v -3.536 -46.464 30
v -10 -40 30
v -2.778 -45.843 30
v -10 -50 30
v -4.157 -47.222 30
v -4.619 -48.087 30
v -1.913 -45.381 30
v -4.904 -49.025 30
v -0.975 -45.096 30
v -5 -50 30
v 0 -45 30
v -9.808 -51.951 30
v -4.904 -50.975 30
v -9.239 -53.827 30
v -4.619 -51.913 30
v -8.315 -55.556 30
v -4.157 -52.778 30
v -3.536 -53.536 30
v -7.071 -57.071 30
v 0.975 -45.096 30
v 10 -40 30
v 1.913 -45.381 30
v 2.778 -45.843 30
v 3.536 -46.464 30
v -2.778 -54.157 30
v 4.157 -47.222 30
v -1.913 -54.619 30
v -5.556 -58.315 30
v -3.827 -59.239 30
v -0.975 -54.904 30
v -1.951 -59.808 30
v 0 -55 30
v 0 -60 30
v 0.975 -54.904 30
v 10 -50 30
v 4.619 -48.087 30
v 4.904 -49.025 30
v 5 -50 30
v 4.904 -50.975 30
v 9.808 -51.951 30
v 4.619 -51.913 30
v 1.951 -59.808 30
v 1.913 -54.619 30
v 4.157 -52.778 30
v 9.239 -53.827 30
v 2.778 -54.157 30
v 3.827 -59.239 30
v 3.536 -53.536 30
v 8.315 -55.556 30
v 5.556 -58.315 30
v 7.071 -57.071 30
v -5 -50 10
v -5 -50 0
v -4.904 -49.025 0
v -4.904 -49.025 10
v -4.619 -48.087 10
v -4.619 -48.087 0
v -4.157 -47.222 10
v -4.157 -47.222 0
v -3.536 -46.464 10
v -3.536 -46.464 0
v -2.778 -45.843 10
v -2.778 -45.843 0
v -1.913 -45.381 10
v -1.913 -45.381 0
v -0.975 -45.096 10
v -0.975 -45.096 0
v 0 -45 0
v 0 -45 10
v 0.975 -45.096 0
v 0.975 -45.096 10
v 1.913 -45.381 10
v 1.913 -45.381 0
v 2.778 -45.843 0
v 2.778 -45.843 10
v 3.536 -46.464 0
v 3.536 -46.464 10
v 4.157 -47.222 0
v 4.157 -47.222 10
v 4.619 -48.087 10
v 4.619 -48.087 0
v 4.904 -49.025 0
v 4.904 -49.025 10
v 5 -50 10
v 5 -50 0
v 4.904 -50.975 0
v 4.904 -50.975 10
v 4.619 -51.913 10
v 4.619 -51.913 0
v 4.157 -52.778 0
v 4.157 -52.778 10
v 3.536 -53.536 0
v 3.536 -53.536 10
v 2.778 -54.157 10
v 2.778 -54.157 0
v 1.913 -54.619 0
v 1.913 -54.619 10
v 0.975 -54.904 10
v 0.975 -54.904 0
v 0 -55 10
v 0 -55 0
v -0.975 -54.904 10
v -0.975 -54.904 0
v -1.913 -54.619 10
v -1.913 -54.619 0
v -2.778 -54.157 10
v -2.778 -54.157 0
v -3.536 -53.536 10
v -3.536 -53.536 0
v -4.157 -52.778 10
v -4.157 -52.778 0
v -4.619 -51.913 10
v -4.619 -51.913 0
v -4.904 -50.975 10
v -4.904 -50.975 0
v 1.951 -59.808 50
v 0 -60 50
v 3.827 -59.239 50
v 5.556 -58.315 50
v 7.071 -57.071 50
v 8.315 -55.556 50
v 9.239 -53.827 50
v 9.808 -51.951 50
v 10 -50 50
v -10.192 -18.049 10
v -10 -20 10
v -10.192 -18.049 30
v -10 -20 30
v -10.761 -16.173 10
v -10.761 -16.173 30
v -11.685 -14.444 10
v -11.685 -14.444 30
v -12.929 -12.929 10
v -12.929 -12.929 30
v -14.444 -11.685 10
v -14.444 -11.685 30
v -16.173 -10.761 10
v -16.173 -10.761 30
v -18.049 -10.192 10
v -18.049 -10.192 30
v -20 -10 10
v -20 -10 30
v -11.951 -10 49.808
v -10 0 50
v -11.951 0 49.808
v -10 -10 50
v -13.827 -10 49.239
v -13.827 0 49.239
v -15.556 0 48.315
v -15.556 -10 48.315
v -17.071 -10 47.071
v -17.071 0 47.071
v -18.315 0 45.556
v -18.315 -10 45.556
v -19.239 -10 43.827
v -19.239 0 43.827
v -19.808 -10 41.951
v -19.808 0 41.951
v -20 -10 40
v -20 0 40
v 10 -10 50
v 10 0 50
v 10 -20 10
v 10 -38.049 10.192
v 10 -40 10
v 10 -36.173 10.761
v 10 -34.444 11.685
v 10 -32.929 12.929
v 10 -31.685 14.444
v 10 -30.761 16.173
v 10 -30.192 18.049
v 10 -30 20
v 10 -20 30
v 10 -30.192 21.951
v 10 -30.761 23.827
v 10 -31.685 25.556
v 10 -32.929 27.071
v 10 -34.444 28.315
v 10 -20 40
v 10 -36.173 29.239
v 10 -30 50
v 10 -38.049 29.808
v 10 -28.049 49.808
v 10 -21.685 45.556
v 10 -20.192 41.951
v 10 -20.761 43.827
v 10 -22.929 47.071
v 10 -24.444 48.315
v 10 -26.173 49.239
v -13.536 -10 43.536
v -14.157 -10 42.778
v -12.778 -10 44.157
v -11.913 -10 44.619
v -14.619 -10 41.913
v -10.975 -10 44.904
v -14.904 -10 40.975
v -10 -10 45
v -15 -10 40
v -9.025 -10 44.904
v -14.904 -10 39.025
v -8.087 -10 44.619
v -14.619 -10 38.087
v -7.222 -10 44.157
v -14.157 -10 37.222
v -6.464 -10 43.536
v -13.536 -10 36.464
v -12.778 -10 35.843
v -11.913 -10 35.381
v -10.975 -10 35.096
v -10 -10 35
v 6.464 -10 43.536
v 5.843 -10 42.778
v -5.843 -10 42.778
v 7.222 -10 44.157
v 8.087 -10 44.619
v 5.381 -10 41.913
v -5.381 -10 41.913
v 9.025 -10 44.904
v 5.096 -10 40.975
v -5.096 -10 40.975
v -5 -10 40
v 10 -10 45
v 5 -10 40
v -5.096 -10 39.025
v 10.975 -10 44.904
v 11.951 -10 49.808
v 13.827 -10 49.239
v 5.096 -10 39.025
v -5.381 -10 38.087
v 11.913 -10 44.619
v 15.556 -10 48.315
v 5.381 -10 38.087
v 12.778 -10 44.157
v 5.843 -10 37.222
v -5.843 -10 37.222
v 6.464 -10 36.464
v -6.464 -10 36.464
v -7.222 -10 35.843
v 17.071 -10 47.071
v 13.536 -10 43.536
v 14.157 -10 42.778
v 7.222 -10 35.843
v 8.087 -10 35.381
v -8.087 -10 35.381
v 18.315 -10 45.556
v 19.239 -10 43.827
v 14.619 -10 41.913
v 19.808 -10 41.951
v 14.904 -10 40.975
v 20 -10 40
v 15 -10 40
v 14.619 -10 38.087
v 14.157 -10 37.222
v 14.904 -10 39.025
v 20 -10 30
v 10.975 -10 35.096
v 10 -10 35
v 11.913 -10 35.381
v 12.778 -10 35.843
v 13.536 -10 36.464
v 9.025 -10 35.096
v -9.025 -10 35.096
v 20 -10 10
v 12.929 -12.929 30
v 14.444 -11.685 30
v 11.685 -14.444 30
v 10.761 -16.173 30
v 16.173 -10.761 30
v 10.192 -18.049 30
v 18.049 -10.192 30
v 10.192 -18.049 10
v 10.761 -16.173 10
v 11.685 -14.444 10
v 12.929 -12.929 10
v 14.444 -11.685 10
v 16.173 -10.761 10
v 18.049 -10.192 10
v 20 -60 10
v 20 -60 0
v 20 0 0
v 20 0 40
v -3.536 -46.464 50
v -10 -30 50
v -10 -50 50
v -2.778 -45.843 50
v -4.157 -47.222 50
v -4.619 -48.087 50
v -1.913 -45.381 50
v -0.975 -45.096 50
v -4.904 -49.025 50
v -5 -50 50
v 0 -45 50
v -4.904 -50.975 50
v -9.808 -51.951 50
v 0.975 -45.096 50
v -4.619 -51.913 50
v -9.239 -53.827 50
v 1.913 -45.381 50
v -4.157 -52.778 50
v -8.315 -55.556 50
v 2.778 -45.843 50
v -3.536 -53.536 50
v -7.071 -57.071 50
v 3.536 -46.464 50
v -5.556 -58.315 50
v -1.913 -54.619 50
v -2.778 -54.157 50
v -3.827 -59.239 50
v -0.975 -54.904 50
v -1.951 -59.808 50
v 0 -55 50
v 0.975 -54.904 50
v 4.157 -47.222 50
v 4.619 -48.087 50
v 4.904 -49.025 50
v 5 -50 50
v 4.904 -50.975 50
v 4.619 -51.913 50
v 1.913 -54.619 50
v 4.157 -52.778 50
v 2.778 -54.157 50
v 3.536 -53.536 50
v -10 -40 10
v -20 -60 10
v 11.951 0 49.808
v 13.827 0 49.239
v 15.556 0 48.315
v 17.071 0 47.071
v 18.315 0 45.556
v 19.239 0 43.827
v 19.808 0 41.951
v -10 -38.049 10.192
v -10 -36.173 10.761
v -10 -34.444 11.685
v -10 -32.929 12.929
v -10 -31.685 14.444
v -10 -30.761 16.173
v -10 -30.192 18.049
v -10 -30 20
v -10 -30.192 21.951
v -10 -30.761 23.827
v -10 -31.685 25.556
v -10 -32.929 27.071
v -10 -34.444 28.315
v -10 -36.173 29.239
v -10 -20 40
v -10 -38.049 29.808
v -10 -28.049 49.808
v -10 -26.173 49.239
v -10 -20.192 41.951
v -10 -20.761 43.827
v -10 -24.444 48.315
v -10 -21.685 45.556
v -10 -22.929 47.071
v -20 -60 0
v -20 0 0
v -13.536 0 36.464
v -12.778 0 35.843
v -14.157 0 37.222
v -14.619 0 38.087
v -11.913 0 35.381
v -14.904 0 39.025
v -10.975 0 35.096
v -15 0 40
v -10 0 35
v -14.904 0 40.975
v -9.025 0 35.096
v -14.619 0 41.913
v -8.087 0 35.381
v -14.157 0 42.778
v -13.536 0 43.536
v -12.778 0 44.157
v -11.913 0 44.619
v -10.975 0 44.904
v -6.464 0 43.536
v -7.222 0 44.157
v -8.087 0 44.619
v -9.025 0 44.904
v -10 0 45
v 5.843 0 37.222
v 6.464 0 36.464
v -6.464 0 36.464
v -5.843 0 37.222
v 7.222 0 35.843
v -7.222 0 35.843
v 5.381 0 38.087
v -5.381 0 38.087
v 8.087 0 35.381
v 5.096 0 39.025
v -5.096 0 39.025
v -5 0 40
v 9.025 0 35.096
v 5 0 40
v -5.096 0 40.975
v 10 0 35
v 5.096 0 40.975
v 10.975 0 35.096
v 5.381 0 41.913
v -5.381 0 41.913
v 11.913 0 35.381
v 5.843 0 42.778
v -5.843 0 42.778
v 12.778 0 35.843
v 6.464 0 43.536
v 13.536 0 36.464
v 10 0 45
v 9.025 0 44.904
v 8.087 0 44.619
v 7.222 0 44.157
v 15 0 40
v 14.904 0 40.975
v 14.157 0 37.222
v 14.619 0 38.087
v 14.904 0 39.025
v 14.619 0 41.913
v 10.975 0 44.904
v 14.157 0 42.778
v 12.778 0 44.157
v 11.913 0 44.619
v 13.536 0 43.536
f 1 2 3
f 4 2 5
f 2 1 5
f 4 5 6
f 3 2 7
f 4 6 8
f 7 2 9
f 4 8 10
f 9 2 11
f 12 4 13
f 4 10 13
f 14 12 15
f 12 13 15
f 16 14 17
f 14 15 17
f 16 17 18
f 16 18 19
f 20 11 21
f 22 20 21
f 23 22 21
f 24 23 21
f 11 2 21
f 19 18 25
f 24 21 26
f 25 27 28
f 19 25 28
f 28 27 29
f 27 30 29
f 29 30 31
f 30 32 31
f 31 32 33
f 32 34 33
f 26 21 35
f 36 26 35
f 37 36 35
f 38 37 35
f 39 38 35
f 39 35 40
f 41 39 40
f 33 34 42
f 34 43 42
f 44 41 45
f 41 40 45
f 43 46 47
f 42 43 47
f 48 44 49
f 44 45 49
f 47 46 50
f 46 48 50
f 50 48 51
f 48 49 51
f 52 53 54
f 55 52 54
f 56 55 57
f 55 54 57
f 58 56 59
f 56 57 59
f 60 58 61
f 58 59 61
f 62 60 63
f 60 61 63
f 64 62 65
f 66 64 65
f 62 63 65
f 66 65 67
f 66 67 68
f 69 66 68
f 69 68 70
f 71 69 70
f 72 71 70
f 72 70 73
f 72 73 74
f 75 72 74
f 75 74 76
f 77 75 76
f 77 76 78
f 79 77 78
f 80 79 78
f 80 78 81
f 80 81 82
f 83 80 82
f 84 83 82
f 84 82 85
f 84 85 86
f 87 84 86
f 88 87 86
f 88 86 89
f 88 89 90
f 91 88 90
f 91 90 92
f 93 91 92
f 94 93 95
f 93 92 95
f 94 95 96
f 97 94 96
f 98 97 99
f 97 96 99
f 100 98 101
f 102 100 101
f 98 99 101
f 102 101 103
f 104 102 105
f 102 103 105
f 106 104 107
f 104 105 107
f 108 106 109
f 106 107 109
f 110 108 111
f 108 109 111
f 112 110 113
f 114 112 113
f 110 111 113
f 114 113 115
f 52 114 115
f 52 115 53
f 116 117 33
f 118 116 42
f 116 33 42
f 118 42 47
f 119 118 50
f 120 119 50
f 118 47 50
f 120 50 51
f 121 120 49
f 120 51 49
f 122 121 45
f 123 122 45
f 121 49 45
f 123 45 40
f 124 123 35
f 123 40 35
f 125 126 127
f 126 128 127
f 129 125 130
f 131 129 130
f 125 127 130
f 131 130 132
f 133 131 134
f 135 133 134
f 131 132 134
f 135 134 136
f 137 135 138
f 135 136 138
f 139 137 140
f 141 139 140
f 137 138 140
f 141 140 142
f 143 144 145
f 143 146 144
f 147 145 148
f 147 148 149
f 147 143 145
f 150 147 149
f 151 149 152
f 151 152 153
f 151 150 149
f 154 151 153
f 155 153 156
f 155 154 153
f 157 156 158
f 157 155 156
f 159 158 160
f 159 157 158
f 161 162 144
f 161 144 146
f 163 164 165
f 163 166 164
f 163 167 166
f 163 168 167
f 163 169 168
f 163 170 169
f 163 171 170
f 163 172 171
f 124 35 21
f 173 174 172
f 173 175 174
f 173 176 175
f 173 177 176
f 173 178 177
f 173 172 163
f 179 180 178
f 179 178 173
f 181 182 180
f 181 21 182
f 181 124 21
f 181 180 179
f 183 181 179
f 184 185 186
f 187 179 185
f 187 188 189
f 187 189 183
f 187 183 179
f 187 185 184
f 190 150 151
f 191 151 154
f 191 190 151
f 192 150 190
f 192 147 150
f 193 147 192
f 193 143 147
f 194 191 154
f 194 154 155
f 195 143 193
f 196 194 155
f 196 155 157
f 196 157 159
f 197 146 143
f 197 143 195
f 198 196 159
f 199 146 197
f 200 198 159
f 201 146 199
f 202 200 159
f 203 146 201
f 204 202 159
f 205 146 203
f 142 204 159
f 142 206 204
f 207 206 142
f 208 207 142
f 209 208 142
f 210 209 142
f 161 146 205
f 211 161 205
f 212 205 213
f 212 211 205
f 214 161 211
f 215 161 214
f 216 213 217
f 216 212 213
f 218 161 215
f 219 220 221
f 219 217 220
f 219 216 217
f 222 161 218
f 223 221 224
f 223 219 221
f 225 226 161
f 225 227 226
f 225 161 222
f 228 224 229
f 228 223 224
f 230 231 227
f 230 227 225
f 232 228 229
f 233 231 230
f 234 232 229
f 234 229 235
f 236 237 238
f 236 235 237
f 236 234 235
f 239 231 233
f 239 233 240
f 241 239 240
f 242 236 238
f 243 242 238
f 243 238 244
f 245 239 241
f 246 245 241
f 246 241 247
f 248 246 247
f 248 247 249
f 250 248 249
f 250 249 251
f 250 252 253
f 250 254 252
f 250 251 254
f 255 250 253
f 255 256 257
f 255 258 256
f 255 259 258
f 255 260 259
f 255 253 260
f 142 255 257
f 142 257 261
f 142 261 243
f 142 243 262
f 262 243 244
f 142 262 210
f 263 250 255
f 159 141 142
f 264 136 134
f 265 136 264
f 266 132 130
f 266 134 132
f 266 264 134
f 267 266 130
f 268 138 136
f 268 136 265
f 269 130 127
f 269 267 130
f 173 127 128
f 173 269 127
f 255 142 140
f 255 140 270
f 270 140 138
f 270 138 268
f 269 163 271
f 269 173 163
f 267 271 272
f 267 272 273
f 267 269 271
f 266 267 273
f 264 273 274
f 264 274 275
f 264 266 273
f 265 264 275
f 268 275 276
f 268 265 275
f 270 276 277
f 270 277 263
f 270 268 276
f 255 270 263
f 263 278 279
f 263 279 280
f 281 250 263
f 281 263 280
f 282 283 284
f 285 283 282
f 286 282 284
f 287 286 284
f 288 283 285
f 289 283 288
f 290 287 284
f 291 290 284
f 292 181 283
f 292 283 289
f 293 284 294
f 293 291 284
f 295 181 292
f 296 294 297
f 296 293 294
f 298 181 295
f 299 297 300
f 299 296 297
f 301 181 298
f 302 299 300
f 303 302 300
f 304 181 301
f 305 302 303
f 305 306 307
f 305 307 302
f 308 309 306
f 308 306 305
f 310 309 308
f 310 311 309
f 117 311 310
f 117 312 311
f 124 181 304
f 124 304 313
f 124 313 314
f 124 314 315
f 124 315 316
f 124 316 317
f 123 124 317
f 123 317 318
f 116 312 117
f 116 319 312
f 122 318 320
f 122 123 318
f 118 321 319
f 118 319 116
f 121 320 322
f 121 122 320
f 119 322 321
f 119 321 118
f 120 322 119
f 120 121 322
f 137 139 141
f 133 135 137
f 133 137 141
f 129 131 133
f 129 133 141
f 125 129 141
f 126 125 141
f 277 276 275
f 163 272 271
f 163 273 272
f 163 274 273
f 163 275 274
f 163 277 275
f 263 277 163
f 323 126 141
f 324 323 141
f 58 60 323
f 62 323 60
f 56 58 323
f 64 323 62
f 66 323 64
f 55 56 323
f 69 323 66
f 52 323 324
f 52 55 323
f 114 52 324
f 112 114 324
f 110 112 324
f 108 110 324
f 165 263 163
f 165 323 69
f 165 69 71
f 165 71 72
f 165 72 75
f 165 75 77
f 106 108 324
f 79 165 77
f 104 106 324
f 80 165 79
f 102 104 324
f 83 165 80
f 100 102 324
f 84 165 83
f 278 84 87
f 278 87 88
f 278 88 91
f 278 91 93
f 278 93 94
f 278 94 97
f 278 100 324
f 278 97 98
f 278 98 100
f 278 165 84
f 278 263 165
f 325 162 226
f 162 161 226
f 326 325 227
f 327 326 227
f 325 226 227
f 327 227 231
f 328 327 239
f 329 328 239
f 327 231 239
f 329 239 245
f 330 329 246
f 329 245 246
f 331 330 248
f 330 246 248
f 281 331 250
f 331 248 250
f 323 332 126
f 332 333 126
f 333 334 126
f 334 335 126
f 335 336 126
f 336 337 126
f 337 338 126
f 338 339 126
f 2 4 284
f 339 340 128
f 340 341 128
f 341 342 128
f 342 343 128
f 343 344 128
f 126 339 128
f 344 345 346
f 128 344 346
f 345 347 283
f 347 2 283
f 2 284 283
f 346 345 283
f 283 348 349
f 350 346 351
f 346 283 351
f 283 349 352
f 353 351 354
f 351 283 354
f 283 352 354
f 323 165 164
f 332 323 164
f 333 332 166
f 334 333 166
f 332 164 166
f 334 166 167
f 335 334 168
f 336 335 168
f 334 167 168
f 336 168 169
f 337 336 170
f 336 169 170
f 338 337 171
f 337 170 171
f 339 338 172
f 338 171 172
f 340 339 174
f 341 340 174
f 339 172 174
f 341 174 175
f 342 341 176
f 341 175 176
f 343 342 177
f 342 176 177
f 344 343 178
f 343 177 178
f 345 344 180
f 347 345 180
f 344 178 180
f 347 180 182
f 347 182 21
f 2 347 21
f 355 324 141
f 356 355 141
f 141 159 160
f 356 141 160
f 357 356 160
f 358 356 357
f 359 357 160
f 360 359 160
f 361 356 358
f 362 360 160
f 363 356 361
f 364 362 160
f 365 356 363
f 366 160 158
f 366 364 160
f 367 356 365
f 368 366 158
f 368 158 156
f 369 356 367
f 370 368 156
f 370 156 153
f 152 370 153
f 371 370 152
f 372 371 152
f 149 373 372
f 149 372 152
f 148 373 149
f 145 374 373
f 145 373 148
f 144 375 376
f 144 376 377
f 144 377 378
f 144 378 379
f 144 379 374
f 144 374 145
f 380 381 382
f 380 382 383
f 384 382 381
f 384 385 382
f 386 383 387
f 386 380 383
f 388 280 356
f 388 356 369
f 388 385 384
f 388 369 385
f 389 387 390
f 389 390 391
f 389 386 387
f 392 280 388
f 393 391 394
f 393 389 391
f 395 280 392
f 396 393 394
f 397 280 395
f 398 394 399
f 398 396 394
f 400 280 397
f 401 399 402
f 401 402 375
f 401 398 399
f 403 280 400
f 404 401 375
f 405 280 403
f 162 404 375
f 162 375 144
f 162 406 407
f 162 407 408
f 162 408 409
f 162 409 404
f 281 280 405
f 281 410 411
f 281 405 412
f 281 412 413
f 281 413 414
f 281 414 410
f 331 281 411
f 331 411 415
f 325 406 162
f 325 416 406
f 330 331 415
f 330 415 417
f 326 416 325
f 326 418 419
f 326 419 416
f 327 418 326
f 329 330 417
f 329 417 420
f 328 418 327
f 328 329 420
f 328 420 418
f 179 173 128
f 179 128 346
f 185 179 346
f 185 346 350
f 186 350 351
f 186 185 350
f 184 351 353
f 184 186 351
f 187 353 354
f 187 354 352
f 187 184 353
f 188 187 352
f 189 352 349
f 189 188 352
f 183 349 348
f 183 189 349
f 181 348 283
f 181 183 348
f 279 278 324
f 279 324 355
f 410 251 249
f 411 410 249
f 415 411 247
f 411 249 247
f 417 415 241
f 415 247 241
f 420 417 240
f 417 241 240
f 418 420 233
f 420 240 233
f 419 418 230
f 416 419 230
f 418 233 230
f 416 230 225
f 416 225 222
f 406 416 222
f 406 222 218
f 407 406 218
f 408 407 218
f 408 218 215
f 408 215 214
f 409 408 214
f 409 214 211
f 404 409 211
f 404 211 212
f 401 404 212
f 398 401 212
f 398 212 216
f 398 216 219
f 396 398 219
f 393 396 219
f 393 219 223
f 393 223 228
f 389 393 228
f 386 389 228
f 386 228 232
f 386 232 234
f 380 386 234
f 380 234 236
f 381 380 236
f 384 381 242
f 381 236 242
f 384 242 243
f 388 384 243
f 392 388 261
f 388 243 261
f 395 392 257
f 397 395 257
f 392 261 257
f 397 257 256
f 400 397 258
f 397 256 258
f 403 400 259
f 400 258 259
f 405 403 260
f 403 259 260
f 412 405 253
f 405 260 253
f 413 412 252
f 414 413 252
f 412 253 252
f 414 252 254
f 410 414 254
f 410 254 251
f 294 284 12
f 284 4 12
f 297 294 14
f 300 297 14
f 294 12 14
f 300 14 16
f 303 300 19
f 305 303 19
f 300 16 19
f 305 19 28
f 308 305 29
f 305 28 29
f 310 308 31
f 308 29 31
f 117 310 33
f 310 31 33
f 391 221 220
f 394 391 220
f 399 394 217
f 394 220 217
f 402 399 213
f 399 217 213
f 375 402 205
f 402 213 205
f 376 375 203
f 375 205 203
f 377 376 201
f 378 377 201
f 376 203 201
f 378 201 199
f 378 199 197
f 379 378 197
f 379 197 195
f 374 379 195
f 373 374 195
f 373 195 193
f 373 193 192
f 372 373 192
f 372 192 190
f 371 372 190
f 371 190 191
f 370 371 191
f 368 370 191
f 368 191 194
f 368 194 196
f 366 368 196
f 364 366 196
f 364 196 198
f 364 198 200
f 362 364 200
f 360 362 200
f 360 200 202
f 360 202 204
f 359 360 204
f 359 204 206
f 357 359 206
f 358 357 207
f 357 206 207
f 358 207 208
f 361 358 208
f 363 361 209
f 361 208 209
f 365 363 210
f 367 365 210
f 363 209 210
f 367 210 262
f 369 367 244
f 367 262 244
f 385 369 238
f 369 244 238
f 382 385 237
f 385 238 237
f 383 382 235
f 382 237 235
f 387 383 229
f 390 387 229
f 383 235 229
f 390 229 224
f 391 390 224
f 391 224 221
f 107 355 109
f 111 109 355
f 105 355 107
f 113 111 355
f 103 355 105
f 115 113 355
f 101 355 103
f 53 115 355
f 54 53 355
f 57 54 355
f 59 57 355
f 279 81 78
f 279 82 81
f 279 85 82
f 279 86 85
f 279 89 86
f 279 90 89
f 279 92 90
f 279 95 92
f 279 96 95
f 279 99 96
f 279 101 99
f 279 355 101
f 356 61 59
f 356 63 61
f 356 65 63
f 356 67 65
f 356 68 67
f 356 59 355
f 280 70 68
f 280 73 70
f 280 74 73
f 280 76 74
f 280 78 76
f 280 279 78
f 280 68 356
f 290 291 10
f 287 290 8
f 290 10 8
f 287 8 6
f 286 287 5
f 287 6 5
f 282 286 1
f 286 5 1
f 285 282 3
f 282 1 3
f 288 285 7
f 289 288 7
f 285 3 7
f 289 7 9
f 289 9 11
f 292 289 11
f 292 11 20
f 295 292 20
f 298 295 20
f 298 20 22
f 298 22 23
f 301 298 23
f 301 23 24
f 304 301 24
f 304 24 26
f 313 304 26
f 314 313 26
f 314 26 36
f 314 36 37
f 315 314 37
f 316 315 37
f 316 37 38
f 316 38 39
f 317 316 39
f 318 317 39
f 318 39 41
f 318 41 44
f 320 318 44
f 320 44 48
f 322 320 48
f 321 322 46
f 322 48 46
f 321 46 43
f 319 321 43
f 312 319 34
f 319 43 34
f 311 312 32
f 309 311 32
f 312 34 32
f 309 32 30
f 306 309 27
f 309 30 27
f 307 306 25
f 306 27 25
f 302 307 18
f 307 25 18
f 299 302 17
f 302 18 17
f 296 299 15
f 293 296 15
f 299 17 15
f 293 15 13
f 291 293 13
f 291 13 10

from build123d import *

# Parameters (mm, degrees)
F1_DEPTH  = 20
F3_DEPTH  = 10
F5_DEPTH  = 20
F6_R      = 10
F6_R_2    = 9.99999
F8_D      = 10
F10_D     = 10
F10_DEPTH = 10.001


# Not quite as in the source:
# - a fillet or chamfer is up to 0.001 mm smaller than in the source, because OpenCascade refuses the exact size


with BuildPart() as f1:
    # F0 (on Right) → F1 (new body, symmetric)
    with BuildSketch(Plane.YZ):
        Polygon((-60, 0), (0, 0), (0, 50), (-10, 50), (-10, 10), (-60, 10), align=None)
    extrude(amount=F1_DEPTH, both=True)

    # F2 (on Right) → F3 (join, symmetric)
    with BuildSketch(Plane.YZ):
        with BuildLine():
            Line((-60, 10), (-10, 10))
            Line((-10, 10), (-10, 30))
            Line((-10, 30), (-20, 30))
            Line((-20, 30), (-20, 40))
            ThreePointArc((-20, 40), (-22.9289321881, 47.0710678119), (-30, 50))
            Line((-30, 50), (-60, 50))
            Line((-60, 50), (-60, 10))
        make_face()
    extrude(amount=F3_DEPTH, both=True)

    # F4 (on face) → F5 (cut, through all)
    with BuildSketch(Plane.YZ.offset(10)):
        with BuildLine():
            Line((-60, 30), (-60, 10))
            Line((-60, 10), (-40, 10))
            ThreePointArc((-40, 10), (-30, 20), (-40, 30))
            Line((-40, 30), (-60, 30))
        make_face()
    extrude(amount=-F5_DEPTH, mode=Mode.SUBTRACT)

    # F6 (call 1 of 6: OpenCascade refuses the feature's edges together)
    f6_edges = [f1.edges().sort_by_distance(p)[0] for p in [
        (-20, -5, 50),
    ]]
    fillet(f6_edges, radius=F6_R)

    # F6#2 (call 2 of 6)
    f6_2_edges = [f1.edges().sort_by_distance(p)[0] for p in [
        (20, -5, 50),
    ]]
    fillet(f6_2_edges, radius=F6_R)

    # F6#3 (call 3 of 6)
    f6_3_edges = [f1.edges().sort_by_distance(p)[0] for p in [
        (-10, -60, 40),
    ]]
    fillet(f6_3_edges, radius=F6_R)

    # F6#4 (call 4 of 6) (radius 10 in the source; OpenCascade refuses exactly that, so slightly less here)
    f6_4_edges = [f1.edges().sort_by_distance(p)[0] for p in [
        (10, -60, 40),
    ]]
    fillet(f6_4_edges, radius=F6_R_2)

    # F6#5 (call 5 of 6) (radius 10 in the source; OpenCascade refuses exactly that, so slightly less here)
    f6_5_edges = [f1.edges().sort_by_distance(p)[0] for p in [
        (10, -10, 20),
    ]]
    fillet(f6_5_edges, radius=F6_R_2)

    # F6#6 (call 6 of 6) (radius 10 in the source; OpenCascade refuses exactly that, so slightly less here)
    f6_6_edges = [f1.edges().sort_by_distance(p)[0] for p in [
        (-10, -10, 20),
    ]]
    fillet(f6_6_edges, radius=F6_R_2)

    # F8 (through all)
    with Locations(Plane.XY.offset(50)):
        with Locations((0, -50)):
            Hole(F8_D / 2)

    # F10 (through all, one way)
    with BuildSketch(Plane.XZ.offset(10)):
        with Locations((-10, 40), (10, 40)):
            Circle(F10_D / 2)
    extrude(amount=-F10_DEPTH, mode=Mode.SUBTRACT)


solid = f1.part
